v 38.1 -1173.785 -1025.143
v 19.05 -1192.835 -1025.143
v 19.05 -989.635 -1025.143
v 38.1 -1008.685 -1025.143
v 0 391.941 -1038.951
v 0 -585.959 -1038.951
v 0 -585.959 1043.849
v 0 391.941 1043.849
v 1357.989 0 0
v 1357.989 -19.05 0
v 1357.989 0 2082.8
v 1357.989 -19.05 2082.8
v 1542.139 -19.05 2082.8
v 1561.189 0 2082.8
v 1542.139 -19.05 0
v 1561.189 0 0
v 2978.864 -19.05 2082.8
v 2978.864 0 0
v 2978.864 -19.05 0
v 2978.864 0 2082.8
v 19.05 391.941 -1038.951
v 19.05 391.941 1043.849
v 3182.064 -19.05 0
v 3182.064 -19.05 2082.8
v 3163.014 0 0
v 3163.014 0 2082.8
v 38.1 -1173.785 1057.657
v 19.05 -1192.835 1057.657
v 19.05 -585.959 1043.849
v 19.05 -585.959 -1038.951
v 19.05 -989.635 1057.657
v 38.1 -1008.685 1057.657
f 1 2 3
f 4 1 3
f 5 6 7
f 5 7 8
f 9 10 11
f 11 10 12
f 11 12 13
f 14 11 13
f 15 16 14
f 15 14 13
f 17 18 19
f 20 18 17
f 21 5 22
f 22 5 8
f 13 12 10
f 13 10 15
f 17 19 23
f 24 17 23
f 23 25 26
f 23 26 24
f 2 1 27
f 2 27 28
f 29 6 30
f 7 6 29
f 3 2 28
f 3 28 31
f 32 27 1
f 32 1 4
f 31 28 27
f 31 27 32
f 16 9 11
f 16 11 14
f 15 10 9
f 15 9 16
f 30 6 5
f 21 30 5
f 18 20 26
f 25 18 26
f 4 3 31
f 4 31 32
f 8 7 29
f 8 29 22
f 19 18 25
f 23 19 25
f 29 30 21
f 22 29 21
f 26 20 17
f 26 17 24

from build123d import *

# Parameters (mm, degrees)
F0_W      = 977.9
F0_H      = 2082.8
F1_DEPTH  = 19.05
F2_W      = 203.2
F2_H      = 2082.8
F3_DEPTH  = 19.05
F5_DEPTH  = 2082.8
F6_W      = 203.2
F6_H      = 2082.8
F7_DEPTH  = 19.05
F9_DEPTH  = 2082.8
F10_W     = 203.2
F10_H     = 2082.8
F11_DEPTH = 19.05
F13_DEPTH = 2082.8


with BuildPart() as f1:
    # F0 (on Right) → F1 (new body)
    with BuildSketch(Plane.YZ):
        with Locations((-97.009351, 2.449164)):
            Rectangle(F0_W, F0_H)
    extrude(amount=F1_DEPTH)


with BuildPart() as f3:
    # F2 (on Front) → F3 (new body)
    with BuildSketch(Plane.XZ):
        with Locations((3080.463687, 1041.4)):
            Rectangle(F2_W, F2_H)
    extrude(amount=F3_DEPTH)

    # F4 (on face) → F5 (cut)
    with BuildSketch(Plane.XY.offset(2082.8)):
        Polygon((3163.013687, 0), (3182.063687, -19.05), (3182.063687, 0), align=None)
    extrude(amount=-F5_DEPTH, mode=Mode.SUBTRACT)


with BuildPart() as f7:
    # F6 (on face) → F7 (new body)
    with BuildSketch(Plane.XZ.offset(19.05)):
        with Locations((1459.589167, 1041.4)):
            Rectangle(F6_W, F6_H)
    extrude(amount=-F7_DEPTH)

    # F8 (on face) → F9 (cut)
    with BuildSketch(Plane.XY.offset(2082.8)):
        Polygon((1561.189167, 0), (1542.139167, -19.05), (1561.189167, -19.05), align=None)
    extrude(amount=-F9_DEPTH, mode=Mode.SUBTRACT)


with BuildPart() as f11:
    # F10 (on face) → F11 (new body)
    with BuildSketch(Plane.YZ.offset(19.05)):
        with Locations((-1091.234893, 16.256571)):
            Rectangle(F10_W, F10_H)
    extrude(amount=F11_DEPTH)

    # F12 (on face) → F13 (cut)
    with BuildSketch(Plane.XY.offset(1057.656571)):
        Polygon((38.1, -1192.834893), (38.1, -1173.784893), (19.05, -1192.834893), align=None)
        Polygon((19.05, -989.634893), (38.1, -1008.684893), (38.1, -989.634893), align=None)
    extrude(amount=-F13_DEPTH, mode=Mode.SUBTRACT)


solid = Compound([f1.part, f3.part, f7.part, f11.part])
